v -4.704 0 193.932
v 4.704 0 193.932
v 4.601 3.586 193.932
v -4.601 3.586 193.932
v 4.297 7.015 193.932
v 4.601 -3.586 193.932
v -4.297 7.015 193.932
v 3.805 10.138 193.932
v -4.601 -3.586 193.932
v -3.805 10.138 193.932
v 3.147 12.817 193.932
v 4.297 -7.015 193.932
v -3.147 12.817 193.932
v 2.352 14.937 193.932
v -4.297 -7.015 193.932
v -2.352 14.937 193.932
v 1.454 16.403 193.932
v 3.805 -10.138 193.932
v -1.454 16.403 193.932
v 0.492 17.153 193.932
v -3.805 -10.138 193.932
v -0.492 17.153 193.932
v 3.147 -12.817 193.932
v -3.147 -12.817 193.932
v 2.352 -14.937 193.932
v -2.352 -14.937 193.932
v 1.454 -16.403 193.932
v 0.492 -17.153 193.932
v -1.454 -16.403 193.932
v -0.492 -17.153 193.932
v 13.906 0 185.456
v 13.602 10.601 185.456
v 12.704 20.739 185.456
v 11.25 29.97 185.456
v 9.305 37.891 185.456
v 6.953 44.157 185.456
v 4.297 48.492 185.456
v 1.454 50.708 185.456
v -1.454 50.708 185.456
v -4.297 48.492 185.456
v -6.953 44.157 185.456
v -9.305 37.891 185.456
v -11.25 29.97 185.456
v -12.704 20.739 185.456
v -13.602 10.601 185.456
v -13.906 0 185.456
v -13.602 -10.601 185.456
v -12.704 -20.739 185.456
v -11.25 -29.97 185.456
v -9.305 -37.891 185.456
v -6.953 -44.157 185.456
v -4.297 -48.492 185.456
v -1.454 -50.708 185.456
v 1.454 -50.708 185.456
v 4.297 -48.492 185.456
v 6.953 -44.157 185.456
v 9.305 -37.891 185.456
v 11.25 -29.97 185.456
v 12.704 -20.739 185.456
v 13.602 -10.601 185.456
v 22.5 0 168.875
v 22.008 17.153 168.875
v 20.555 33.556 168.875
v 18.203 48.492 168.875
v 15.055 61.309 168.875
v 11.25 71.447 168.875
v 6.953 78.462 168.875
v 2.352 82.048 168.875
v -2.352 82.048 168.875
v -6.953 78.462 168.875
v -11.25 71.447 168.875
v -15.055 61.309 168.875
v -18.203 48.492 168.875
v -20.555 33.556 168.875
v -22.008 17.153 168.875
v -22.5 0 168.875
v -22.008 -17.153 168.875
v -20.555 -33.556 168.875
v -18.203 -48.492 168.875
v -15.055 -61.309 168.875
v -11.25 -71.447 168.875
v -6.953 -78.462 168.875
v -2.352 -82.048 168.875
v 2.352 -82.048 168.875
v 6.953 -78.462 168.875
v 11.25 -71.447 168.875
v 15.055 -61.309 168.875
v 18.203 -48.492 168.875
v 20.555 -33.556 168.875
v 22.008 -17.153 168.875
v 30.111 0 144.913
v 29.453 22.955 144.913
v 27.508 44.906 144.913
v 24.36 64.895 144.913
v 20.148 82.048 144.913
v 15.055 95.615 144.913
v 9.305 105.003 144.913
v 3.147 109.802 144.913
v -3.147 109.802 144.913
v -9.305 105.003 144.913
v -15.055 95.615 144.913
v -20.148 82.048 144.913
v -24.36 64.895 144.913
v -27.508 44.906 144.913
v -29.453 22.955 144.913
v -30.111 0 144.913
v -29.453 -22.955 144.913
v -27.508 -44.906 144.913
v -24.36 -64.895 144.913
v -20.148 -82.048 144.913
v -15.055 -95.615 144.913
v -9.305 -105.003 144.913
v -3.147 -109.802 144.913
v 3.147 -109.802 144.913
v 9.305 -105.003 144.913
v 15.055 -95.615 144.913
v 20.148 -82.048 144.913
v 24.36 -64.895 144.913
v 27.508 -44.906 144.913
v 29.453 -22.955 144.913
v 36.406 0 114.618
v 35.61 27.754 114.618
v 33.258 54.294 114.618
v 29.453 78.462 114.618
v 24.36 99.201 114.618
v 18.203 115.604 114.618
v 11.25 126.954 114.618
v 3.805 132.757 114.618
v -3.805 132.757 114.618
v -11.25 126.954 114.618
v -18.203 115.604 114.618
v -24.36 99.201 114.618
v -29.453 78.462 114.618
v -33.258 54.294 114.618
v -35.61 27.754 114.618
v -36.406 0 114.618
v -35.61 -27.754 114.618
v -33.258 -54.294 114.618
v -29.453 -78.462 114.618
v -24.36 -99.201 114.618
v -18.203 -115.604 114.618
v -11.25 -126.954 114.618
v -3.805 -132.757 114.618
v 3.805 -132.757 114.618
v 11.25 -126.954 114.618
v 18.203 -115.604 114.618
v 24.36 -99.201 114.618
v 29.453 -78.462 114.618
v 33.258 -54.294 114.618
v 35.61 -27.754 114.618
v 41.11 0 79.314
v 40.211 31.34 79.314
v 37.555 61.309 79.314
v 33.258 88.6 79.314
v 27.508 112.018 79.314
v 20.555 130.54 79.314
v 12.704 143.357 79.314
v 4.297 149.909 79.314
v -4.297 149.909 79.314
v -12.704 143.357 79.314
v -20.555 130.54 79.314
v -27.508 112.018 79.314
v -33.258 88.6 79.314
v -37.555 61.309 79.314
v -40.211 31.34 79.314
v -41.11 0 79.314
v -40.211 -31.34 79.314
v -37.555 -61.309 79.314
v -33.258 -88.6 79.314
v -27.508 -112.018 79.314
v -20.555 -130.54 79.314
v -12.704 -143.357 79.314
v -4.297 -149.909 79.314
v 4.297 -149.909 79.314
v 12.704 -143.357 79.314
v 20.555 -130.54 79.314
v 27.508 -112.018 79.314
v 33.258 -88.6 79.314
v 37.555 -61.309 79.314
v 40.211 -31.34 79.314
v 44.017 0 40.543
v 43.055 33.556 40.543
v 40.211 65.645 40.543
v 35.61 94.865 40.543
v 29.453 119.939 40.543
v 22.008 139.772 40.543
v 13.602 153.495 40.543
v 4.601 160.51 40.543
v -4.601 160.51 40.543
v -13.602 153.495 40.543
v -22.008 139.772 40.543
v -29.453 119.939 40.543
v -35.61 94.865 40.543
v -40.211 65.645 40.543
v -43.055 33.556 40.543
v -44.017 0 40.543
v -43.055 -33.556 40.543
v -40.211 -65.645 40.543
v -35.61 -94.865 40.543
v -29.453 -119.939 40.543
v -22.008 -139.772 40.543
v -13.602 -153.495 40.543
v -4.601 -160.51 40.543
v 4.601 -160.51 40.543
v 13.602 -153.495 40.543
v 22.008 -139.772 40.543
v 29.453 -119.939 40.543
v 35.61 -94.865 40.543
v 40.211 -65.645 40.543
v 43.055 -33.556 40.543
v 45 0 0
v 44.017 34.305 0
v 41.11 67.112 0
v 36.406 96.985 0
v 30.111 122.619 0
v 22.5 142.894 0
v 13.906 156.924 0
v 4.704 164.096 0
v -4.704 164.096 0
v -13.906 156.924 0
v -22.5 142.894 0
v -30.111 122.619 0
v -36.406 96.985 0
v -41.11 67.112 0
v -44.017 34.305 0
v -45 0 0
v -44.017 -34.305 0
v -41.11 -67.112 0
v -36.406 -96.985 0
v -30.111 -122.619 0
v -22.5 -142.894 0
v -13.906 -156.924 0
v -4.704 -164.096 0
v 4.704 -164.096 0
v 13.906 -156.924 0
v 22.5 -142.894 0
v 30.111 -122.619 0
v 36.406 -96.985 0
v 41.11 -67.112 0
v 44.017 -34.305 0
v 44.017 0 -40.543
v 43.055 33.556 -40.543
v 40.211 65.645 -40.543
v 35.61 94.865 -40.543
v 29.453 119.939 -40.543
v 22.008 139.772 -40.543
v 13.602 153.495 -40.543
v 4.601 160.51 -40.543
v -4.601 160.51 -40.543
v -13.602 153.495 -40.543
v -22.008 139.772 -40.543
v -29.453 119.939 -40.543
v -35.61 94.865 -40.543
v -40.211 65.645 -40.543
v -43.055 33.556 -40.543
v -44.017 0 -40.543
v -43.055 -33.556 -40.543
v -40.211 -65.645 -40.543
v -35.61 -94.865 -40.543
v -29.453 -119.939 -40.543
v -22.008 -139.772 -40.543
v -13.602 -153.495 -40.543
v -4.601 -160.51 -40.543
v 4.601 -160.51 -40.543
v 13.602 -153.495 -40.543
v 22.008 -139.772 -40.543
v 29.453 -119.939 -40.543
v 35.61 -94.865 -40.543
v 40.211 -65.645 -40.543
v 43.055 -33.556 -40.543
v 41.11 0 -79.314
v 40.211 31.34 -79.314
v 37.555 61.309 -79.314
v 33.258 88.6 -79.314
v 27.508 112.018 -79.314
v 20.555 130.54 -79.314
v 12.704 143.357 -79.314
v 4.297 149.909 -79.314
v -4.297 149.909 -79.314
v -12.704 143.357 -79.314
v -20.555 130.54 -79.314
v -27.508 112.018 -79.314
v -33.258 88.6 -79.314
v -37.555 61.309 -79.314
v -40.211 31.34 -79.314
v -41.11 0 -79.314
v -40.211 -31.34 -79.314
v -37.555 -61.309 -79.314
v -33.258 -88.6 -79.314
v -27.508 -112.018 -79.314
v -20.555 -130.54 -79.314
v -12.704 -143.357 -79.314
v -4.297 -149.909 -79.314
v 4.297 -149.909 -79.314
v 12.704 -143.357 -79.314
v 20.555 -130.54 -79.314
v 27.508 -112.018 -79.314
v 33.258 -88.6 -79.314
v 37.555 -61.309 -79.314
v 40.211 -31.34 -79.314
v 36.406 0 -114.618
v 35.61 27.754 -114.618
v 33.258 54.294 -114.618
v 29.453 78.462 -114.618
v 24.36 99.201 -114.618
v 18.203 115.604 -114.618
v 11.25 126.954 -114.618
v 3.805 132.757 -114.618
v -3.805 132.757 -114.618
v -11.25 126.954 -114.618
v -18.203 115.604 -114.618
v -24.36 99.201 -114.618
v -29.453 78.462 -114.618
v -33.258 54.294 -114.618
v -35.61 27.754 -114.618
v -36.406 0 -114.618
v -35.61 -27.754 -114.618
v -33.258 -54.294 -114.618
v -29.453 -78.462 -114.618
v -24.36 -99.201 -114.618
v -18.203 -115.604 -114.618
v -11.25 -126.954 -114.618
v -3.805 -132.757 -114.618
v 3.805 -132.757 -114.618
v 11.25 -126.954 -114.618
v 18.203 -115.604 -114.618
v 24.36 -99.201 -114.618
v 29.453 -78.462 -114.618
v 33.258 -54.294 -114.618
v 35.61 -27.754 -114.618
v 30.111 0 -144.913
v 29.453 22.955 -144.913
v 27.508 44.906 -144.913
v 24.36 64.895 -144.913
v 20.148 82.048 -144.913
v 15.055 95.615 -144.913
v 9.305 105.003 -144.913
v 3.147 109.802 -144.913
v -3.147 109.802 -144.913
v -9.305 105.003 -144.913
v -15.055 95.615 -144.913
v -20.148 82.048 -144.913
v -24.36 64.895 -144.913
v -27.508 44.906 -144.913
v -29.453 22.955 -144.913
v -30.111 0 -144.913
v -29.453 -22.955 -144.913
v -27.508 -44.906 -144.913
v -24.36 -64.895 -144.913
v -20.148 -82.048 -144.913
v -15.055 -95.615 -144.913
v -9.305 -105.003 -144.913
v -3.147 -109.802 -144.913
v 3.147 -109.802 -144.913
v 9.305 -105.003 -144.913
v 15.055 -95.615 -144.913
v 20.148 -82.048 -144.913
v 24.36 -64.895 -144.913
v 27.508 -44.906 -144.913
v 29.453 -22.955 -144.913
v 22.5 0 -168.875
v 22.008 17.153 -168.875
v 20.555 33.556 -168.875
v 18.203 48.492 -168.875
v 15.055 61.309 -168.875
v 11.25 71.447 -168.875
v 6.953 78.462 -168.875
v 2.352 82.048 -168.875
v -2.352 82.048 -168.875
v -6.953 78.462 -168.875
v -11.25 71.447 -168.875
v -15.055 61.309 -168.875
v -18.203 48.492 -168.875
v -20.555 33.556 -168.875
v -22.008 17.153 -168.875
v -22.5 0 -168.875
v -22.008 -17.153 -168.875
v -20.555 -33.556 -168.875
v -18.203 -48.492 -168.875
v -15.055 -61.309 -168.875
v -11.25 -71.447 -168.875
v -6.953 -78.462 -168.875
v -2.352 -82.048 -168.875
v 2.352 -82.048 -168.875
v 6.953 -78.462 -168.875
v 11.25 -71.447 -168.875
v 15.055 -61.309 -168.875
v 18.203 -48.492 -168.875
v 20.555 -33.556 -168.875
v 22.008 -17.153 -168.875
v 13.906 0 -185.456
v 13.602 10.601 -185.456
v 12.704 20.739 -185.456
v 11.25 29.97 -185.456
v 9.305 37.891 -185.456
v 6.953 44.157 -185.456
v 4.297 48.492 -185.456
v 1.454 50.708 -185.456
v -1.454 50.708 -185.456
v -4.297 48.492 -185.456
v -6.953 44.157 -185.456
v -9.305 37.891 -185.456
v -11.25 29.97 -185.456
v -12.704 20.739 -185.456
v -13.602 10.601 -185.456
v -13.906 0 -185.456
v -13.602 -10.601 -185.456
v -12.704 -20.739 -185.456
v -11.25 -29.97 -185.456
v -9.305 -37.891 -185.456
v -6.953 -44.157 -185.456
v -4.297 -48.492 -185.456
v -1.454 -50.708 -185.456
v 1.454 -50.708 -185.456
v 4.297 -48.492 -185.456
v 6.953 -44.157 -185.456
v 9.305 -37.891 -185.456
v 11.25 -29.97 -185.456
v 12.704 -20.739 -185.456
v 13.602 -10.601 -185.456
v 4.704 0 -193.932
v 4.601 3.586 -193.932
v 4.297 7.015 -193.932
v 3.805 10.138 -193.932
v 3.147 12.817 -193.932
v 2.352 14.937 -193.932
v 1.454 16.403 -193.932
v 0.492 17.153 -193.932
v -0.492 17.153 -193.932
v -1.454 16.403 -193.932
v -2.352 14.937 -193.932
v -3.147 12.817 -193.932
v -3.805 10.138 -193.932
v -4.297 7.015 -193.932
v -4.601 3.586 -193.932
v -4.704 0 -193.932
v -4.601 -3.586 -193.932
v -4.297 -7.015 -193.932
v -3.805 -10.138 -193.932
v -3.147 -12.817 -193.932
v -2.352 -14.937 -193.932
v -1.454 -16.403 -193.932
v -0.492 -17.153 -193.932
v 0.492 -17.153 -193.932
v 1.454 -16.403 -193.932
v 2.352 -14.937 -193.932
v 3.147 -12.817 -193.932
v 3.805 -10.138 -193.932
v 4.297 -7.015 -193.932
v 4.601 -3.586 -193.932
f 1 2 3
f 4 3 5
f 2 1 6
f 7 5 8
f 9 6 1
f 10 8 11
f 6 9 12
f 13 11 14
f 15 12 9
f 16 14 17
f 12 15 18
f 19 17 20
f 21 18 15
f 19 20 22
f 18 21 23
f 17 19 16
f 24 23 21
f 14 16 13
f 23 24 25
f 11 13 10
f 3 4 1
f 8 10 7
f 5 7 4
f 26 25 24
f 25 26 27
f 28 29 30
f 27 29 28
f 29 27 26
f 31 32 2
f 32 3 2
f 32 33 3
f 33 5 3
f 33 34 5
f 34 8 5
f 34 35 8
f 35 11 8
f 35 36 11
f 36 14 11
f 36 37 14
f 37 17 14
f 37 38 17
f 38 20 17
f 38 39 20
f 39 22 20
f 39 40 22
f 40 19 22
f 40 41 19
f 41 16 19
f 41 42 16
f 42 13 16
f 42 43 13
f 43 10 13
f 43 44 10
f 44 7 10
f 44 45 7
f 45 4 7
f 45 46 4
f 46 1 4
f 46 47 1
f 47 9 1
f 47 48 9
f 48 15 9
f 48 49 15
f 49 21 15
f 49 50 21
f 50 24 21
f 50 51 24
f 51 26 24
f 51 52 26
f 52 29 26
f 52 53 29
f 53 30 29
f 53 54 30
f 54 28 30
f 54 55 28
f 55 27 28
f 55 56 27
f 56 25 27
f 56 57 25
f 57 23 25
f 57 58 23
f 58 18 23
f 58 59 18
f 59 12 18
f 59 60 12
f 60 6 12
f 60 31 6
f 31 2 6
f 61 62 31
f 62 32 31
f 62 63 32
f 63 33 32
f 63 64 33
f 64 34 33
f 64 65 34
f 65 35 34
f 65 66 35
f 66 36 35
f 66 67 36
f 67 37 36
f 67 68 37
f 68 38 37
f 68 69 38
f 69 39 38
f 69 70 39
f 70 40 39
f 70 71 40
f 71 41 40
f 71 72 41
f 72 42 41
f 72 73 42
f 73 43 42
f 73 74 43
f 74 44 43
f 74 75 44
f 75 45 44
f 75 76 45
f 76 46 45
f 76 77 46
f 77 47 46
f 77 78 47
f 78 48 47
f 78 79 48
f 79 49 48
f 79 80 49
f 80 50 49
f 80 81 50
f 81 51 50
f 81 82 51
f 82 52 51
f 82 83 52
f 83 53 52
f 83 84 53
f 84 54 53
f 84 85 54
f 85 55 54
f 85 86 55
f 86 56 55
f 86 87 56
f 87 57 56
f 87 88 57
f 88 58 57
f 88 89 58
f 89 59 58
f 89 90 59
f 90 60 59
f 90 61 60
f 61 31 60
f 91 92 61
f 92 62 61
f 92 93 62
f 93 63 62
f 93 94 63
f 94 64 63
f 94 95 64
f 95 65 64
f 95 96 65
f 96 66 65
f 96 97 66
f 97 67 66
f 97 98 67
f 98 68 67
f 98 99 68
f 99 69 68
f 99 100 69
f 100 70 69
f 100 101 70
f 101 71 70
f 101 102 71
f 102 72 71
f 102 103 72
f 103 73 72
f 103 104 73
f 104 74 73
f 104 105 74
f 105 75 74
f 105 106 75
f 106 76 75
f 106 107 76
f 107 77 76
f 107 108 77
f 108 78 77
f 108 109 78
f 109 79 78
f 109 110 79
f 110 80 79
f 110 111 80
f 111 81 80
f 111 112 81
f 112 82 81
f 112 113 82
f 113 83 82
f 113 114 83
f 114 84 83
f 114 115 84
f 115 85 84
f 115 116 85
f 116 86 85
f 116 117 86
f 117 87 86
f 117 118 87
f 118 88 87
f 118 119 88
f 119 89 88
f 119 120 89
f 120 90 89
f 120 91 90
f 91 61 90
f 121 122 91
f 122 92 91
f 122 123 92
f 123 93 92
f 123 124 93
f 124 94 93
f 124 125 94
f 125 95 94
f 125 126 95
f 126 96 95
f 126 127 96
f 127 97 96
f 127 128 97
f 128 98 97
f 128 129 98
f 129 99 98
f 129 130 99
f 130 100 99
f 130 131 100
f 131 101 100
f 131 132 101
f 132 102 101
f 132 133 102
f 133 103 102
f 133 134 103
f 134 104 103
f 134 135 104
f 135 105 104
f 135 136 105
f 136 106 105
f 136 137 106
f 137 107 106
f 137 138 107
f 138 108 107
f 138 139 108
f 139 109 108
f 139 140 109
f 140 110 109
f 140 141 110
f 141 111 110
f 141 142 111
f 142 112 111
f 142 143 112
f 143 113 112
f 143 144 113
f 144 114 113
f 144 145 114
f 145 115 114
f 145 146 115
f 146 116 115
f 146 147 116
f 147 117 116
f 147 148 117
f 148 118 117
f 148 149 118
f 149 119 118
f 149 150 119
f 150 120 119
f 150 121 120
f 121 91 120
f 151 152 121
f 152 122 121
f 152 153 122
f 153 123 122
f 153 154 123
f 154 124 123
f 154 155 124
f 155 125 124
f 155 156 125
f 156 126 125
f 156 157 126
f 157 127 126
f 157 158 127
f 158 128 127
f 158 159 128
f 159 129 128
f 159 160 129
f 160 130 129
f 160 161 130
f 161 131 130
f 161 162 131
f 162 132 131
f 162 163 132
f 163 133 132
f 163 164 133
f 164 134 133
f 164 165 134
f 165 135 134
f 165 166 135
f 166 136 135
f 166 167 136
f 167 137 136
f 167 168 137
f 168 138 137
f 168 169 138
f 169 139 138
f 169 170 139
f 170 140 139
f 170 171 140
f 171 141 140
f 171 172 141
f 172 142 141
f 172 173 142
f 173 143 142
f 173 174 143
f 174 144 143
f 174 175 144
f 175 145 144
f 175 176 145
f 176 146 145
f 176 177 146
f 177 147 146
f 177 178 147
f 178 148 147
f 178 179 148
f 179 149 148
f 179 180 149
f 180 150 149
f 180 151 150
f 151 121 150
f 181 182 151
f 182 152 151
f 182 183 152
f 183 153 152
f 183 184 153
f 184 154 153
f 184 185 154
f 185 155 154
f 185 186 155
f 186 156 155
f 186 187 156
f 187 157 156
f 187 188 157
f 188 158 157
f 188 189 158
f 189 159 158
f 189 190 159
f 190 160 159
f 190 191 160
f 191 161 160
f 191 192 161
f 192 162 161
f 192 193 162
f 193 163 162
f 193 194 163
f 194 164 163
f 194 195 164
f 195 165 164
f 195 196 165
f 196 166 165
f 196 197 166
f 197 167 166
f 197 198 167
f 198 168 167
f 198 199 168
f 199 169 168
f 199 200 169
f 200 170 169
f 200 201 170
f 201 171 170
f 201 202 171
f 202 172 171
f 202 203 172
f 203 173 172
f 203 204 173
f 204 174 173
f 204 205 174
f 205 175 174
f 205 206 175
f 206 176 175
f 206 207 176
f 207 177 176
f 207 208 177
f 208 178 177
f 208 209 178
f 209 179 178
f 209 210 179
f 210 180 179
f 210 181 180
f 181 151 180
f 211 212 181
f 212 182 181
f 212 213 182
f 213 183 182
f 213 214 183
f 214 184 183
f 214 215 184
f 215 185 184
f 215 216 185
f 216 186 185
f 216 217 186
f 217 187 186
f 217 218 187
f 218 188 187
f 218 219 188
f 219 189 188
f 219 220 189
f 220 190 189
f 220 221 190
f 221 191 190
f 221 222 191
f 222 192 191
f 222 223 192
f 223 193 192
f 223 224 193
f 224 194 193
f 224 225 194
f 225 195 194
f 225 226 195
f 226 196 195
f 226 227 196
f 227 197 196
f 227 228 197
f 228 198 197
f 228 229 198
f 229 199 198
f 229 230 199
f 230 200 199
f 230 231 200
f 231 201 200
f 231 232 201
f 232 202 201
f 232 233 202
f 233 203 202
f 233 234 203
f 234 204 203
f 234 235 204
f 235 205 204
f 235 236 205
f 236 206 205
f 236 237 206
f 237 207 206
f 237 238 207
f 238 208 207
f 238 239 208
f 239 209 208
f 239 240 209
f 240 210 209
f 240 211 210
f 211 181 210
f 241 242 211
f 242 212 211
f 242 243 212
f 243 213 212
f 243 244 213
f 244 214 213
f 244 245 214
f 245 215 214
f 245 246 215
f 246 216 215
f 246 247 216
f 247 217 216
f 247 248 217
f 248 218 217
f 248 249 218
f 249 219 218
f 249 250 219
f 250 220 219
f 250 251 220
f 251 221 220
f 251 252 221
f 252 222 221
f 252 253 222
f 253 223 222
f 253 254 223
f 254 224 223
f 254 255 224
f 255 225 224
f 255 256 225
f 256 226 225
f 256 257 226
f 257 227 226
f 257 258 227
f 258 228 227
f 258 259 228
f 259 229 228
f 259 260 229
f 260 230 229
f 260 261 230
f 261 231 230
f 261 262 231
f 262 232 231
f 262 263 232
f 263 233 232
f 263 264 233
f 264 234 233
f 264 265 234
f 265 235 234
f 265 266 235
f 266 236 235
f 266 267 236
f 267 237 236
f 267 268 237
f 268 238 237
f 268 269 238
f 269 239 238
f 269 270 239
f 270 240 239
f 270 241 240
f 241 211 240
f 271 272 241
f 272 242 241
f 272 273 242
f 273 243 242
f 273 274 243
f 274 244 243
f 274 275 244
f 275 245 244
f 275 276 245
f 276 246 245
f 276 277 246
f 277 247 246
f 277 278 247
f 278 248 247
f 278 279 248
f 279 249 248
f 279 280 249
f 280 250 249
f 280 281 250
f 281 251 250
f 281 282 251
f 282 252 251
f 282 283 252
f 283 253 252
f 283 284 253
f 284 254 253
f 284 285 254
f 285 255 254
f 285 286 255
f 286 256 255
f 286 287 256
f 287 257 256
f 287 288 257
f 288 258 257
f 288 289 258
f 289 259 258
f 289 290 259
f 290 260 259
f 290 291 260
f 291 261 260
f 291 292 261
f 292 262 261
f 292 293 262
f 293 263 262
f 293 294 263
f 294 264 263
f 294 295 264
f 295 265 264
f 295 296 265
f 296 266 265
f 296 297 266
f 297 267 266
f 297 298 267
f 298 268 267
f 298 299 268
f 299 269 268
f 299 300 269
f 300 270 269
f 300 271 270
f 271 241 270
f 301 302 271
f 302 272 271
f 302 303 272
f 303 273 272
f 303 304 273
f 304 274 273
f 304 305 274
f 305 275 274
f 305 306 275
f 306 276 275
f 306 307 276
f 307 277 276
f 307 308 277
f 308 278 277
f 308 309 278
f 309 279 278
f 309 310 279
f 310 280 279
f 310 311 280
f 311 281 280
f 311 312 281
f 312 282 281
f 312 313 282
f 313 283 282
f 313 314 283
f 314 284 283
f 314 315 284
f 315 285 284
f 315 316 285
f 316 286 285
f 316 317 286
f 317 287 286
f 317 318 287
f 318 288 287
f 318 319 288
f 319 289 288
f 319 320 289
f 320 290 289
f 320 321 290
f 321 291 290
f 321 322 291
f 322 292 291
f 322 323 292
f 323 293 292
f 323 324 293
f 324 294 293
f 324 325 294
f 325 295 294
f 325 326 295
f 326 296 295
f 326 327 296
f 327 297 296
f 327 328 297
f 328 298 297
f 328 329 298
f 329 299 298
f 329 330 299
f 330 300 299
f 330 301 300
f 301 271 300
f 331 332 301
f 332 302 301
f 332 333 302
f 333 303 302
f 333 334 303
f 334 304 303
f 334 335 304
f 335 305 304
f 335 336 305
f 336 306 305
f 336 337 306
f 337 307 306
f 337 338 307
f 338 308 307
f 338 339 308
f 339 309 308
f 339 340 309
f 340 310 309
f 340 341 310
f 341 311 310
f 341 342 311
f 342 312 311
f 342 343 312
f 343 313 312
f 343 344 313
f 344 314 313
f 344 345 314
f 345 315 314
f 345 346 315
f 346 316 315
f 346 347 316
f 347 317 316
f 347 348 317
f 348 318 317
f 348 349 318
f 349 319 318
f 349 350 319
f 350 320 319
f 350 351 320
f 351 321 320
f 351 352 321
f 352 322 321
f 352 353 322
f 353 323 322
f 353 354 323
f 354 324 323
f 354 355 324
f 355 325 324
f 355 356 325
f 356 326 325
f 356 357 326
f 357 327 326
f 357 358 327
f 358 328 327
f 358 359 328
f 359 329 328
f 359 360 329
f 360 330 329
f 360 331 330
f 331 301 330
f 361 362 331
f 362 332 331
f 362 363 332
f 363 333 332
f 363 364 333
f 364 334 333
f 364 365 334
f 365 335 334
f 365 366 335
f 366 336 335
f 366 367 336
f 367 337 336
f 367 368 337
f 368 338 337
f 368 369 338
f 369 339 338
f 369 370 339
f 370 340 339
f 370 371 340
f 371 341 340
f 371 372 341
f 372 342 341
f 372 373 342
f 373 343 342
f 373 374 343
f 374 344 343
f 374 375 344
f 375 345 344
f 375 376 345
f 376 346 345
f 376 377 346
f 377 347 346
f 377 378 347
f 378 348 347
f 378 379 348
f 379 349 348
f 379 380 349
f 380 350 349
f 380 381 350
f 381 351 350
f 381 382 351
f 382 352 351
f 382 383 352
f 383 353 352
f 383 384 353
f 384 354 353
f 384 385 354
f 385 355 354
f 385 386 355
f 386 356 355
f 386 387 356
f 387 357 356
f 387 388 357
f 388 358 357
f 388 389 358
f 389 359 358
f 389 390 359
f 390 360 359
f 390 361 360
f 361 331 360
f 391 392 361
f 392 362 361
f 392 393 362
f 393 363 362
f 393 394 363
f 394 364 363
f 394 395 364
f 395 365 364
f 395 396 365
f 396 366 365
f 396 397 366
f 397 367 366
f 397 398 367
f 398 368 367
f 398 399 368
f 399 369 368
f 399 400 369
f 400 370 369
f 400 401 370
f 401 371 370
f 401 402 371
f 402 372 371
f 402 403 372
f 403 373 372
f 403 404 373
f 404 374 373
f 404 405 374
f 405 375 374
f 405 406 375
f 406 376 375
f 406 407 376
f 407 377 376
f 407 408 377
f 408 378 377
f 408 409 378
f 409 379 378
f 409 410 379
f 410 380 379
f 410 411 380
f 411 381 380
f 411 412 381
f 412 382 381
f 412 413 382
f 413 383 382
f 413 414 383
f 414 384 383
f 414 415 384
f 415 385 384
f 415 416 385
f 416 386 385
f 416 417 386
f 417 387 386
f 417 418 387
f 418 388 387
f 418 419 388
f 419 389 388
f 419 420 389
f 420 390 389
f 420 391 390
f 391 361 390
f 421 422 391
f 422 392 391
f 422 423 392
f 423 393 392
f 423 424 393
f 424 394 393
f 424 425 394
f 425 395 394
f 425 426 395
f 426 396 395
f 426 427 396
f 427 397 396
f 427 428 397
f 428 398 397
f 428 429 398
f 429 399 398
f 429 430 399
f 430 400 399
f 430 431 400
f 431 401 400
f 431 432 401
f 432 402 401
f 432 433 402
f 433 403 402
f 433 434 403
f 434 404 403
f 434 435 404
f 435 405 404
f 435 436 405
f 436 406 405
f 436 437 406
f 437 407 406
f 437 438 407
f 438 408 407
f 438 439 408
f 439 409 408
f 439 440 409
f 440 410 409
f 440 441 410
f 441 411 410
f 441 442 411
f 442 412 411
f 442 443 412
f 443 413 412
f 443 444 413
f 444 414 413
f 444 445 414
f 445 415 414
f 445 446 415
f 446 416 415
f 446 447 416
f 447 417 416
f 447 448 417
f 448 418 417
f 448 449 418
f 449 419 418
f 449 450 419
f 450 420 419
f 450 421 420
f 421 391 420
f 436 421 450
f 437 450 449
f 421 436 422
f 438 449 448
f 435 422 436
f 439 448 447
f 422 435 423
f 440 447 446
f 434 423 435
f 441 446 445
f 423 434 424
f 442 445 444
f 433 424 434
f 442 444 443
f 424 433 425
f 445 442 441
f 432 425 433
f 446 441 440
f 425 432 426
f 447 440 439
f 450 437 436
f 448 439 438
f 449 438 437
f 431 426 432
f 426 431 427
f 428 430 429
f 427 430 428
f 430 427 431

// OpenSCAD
// Generated by SolidPython 1.0.1 on 2020-07-29 00:39:25


scale(v = [3, 11, 13]) {
	sphere(r = 15);
}
/***********************************************
*********      SolidPython code:      **********
************************************************
 
# import packages: SolidPython
from solid import *
from solid.utils import *
from itertools import chain, combinations


class Resize:

    def __init__(self, scad_file):
        self.scad_file = scad_file
        #self.scad_file = import_scad(scad_file)
        # cone/cylinder param:
        self.r1 = 0
        self.r2 = 0
        self.h = 0
        # rectangular prism param:
        self.w = 0
        self.l = 0
        # ellipse param:
        self.r = 0

    # import OpenScad code (file name corresponds to shape)


    # classify shape + parameters
    def assign(self, param1, param2, param3):
        if self.scad_file == 'cone.scad':
            self.r1 = param1
            self.r2 = param2
            self.h = param3
        elif self.scad_file == 'cylinder.scad':
            self.r1 = param1
            self.r2 = param2
            self.h = param3
        elif self.scad_file == 'rectangularPrism.scad':
            self.h = param1
            self.l = param2
            self.w = param3
        else:
            self.r = param1
            self.h = param2

    # resize parameters
    def iterate(self):
        x = range(3, 20, 2)
        i = 1
        if self.scad_file == 'cone.scad':
            tempList = list(combinations(x, 2))
            for temp in tempList:
                param1 = temp[0]
                param2 = temp[1]
                filepath = 'produced_scad_files/' + 'cone' + str(param1) + '_' + str(param2) + '_' + '.scad'
                scad_render_to_file(cylinder(h=param1, r1=param2, r2=0), filepath)

        elif self.scad_file == 'cylinder.scad':
            tempList = list(combinations(x, 3))
            for temp in tempList:
                param1 = temp[0]
                param2 = temp[1]
                filepath = 'produced_scad_files/' + 'cylinder' + str(param1) + '_' + str(param2) + '_' + '.scad'
                scad_render_to_file(cylinder(h=param1, r1=param2, r2=param2), filepath)

        elif self.scad_file == 'rectangularPrism.scad':
            tempList = list(combinations(x, 3))
            for temp in tempList:
                param1 = temp[0]
                param2 = temp[1]
                param3 = temp[2]
                filepath = 'produced_scad_files/' + 'rectangularPrism' + str(param1) + '_' + str(param2) + '_' + str(
                    param3) + '.scad'
                scad_render_to_file(cube(size=(param1, param2, param3)), filepath)

        elif self.scad_file == 'ellipse.scad':
            tempList = list(combinations(x, 4))
            for temp in tempList:
                param1 = temp[0]
                param2 = temp[1]
                param3 = temp[2]
                param4 = temp[3]
                filepath = 'produced_scad_files/' + 'ellipse' + str(param1) + '_' + str(param2) + '_' + str(param3) + '_' + str(param4) + '.scad'
                scad_render_to_file(scale([param1, param2, param3])(sphere(r=param4)), filepath)

    def render_to_scadfile(self):
        scad_render_to_file(scad, 'example.scad') 
 
************************************************/
